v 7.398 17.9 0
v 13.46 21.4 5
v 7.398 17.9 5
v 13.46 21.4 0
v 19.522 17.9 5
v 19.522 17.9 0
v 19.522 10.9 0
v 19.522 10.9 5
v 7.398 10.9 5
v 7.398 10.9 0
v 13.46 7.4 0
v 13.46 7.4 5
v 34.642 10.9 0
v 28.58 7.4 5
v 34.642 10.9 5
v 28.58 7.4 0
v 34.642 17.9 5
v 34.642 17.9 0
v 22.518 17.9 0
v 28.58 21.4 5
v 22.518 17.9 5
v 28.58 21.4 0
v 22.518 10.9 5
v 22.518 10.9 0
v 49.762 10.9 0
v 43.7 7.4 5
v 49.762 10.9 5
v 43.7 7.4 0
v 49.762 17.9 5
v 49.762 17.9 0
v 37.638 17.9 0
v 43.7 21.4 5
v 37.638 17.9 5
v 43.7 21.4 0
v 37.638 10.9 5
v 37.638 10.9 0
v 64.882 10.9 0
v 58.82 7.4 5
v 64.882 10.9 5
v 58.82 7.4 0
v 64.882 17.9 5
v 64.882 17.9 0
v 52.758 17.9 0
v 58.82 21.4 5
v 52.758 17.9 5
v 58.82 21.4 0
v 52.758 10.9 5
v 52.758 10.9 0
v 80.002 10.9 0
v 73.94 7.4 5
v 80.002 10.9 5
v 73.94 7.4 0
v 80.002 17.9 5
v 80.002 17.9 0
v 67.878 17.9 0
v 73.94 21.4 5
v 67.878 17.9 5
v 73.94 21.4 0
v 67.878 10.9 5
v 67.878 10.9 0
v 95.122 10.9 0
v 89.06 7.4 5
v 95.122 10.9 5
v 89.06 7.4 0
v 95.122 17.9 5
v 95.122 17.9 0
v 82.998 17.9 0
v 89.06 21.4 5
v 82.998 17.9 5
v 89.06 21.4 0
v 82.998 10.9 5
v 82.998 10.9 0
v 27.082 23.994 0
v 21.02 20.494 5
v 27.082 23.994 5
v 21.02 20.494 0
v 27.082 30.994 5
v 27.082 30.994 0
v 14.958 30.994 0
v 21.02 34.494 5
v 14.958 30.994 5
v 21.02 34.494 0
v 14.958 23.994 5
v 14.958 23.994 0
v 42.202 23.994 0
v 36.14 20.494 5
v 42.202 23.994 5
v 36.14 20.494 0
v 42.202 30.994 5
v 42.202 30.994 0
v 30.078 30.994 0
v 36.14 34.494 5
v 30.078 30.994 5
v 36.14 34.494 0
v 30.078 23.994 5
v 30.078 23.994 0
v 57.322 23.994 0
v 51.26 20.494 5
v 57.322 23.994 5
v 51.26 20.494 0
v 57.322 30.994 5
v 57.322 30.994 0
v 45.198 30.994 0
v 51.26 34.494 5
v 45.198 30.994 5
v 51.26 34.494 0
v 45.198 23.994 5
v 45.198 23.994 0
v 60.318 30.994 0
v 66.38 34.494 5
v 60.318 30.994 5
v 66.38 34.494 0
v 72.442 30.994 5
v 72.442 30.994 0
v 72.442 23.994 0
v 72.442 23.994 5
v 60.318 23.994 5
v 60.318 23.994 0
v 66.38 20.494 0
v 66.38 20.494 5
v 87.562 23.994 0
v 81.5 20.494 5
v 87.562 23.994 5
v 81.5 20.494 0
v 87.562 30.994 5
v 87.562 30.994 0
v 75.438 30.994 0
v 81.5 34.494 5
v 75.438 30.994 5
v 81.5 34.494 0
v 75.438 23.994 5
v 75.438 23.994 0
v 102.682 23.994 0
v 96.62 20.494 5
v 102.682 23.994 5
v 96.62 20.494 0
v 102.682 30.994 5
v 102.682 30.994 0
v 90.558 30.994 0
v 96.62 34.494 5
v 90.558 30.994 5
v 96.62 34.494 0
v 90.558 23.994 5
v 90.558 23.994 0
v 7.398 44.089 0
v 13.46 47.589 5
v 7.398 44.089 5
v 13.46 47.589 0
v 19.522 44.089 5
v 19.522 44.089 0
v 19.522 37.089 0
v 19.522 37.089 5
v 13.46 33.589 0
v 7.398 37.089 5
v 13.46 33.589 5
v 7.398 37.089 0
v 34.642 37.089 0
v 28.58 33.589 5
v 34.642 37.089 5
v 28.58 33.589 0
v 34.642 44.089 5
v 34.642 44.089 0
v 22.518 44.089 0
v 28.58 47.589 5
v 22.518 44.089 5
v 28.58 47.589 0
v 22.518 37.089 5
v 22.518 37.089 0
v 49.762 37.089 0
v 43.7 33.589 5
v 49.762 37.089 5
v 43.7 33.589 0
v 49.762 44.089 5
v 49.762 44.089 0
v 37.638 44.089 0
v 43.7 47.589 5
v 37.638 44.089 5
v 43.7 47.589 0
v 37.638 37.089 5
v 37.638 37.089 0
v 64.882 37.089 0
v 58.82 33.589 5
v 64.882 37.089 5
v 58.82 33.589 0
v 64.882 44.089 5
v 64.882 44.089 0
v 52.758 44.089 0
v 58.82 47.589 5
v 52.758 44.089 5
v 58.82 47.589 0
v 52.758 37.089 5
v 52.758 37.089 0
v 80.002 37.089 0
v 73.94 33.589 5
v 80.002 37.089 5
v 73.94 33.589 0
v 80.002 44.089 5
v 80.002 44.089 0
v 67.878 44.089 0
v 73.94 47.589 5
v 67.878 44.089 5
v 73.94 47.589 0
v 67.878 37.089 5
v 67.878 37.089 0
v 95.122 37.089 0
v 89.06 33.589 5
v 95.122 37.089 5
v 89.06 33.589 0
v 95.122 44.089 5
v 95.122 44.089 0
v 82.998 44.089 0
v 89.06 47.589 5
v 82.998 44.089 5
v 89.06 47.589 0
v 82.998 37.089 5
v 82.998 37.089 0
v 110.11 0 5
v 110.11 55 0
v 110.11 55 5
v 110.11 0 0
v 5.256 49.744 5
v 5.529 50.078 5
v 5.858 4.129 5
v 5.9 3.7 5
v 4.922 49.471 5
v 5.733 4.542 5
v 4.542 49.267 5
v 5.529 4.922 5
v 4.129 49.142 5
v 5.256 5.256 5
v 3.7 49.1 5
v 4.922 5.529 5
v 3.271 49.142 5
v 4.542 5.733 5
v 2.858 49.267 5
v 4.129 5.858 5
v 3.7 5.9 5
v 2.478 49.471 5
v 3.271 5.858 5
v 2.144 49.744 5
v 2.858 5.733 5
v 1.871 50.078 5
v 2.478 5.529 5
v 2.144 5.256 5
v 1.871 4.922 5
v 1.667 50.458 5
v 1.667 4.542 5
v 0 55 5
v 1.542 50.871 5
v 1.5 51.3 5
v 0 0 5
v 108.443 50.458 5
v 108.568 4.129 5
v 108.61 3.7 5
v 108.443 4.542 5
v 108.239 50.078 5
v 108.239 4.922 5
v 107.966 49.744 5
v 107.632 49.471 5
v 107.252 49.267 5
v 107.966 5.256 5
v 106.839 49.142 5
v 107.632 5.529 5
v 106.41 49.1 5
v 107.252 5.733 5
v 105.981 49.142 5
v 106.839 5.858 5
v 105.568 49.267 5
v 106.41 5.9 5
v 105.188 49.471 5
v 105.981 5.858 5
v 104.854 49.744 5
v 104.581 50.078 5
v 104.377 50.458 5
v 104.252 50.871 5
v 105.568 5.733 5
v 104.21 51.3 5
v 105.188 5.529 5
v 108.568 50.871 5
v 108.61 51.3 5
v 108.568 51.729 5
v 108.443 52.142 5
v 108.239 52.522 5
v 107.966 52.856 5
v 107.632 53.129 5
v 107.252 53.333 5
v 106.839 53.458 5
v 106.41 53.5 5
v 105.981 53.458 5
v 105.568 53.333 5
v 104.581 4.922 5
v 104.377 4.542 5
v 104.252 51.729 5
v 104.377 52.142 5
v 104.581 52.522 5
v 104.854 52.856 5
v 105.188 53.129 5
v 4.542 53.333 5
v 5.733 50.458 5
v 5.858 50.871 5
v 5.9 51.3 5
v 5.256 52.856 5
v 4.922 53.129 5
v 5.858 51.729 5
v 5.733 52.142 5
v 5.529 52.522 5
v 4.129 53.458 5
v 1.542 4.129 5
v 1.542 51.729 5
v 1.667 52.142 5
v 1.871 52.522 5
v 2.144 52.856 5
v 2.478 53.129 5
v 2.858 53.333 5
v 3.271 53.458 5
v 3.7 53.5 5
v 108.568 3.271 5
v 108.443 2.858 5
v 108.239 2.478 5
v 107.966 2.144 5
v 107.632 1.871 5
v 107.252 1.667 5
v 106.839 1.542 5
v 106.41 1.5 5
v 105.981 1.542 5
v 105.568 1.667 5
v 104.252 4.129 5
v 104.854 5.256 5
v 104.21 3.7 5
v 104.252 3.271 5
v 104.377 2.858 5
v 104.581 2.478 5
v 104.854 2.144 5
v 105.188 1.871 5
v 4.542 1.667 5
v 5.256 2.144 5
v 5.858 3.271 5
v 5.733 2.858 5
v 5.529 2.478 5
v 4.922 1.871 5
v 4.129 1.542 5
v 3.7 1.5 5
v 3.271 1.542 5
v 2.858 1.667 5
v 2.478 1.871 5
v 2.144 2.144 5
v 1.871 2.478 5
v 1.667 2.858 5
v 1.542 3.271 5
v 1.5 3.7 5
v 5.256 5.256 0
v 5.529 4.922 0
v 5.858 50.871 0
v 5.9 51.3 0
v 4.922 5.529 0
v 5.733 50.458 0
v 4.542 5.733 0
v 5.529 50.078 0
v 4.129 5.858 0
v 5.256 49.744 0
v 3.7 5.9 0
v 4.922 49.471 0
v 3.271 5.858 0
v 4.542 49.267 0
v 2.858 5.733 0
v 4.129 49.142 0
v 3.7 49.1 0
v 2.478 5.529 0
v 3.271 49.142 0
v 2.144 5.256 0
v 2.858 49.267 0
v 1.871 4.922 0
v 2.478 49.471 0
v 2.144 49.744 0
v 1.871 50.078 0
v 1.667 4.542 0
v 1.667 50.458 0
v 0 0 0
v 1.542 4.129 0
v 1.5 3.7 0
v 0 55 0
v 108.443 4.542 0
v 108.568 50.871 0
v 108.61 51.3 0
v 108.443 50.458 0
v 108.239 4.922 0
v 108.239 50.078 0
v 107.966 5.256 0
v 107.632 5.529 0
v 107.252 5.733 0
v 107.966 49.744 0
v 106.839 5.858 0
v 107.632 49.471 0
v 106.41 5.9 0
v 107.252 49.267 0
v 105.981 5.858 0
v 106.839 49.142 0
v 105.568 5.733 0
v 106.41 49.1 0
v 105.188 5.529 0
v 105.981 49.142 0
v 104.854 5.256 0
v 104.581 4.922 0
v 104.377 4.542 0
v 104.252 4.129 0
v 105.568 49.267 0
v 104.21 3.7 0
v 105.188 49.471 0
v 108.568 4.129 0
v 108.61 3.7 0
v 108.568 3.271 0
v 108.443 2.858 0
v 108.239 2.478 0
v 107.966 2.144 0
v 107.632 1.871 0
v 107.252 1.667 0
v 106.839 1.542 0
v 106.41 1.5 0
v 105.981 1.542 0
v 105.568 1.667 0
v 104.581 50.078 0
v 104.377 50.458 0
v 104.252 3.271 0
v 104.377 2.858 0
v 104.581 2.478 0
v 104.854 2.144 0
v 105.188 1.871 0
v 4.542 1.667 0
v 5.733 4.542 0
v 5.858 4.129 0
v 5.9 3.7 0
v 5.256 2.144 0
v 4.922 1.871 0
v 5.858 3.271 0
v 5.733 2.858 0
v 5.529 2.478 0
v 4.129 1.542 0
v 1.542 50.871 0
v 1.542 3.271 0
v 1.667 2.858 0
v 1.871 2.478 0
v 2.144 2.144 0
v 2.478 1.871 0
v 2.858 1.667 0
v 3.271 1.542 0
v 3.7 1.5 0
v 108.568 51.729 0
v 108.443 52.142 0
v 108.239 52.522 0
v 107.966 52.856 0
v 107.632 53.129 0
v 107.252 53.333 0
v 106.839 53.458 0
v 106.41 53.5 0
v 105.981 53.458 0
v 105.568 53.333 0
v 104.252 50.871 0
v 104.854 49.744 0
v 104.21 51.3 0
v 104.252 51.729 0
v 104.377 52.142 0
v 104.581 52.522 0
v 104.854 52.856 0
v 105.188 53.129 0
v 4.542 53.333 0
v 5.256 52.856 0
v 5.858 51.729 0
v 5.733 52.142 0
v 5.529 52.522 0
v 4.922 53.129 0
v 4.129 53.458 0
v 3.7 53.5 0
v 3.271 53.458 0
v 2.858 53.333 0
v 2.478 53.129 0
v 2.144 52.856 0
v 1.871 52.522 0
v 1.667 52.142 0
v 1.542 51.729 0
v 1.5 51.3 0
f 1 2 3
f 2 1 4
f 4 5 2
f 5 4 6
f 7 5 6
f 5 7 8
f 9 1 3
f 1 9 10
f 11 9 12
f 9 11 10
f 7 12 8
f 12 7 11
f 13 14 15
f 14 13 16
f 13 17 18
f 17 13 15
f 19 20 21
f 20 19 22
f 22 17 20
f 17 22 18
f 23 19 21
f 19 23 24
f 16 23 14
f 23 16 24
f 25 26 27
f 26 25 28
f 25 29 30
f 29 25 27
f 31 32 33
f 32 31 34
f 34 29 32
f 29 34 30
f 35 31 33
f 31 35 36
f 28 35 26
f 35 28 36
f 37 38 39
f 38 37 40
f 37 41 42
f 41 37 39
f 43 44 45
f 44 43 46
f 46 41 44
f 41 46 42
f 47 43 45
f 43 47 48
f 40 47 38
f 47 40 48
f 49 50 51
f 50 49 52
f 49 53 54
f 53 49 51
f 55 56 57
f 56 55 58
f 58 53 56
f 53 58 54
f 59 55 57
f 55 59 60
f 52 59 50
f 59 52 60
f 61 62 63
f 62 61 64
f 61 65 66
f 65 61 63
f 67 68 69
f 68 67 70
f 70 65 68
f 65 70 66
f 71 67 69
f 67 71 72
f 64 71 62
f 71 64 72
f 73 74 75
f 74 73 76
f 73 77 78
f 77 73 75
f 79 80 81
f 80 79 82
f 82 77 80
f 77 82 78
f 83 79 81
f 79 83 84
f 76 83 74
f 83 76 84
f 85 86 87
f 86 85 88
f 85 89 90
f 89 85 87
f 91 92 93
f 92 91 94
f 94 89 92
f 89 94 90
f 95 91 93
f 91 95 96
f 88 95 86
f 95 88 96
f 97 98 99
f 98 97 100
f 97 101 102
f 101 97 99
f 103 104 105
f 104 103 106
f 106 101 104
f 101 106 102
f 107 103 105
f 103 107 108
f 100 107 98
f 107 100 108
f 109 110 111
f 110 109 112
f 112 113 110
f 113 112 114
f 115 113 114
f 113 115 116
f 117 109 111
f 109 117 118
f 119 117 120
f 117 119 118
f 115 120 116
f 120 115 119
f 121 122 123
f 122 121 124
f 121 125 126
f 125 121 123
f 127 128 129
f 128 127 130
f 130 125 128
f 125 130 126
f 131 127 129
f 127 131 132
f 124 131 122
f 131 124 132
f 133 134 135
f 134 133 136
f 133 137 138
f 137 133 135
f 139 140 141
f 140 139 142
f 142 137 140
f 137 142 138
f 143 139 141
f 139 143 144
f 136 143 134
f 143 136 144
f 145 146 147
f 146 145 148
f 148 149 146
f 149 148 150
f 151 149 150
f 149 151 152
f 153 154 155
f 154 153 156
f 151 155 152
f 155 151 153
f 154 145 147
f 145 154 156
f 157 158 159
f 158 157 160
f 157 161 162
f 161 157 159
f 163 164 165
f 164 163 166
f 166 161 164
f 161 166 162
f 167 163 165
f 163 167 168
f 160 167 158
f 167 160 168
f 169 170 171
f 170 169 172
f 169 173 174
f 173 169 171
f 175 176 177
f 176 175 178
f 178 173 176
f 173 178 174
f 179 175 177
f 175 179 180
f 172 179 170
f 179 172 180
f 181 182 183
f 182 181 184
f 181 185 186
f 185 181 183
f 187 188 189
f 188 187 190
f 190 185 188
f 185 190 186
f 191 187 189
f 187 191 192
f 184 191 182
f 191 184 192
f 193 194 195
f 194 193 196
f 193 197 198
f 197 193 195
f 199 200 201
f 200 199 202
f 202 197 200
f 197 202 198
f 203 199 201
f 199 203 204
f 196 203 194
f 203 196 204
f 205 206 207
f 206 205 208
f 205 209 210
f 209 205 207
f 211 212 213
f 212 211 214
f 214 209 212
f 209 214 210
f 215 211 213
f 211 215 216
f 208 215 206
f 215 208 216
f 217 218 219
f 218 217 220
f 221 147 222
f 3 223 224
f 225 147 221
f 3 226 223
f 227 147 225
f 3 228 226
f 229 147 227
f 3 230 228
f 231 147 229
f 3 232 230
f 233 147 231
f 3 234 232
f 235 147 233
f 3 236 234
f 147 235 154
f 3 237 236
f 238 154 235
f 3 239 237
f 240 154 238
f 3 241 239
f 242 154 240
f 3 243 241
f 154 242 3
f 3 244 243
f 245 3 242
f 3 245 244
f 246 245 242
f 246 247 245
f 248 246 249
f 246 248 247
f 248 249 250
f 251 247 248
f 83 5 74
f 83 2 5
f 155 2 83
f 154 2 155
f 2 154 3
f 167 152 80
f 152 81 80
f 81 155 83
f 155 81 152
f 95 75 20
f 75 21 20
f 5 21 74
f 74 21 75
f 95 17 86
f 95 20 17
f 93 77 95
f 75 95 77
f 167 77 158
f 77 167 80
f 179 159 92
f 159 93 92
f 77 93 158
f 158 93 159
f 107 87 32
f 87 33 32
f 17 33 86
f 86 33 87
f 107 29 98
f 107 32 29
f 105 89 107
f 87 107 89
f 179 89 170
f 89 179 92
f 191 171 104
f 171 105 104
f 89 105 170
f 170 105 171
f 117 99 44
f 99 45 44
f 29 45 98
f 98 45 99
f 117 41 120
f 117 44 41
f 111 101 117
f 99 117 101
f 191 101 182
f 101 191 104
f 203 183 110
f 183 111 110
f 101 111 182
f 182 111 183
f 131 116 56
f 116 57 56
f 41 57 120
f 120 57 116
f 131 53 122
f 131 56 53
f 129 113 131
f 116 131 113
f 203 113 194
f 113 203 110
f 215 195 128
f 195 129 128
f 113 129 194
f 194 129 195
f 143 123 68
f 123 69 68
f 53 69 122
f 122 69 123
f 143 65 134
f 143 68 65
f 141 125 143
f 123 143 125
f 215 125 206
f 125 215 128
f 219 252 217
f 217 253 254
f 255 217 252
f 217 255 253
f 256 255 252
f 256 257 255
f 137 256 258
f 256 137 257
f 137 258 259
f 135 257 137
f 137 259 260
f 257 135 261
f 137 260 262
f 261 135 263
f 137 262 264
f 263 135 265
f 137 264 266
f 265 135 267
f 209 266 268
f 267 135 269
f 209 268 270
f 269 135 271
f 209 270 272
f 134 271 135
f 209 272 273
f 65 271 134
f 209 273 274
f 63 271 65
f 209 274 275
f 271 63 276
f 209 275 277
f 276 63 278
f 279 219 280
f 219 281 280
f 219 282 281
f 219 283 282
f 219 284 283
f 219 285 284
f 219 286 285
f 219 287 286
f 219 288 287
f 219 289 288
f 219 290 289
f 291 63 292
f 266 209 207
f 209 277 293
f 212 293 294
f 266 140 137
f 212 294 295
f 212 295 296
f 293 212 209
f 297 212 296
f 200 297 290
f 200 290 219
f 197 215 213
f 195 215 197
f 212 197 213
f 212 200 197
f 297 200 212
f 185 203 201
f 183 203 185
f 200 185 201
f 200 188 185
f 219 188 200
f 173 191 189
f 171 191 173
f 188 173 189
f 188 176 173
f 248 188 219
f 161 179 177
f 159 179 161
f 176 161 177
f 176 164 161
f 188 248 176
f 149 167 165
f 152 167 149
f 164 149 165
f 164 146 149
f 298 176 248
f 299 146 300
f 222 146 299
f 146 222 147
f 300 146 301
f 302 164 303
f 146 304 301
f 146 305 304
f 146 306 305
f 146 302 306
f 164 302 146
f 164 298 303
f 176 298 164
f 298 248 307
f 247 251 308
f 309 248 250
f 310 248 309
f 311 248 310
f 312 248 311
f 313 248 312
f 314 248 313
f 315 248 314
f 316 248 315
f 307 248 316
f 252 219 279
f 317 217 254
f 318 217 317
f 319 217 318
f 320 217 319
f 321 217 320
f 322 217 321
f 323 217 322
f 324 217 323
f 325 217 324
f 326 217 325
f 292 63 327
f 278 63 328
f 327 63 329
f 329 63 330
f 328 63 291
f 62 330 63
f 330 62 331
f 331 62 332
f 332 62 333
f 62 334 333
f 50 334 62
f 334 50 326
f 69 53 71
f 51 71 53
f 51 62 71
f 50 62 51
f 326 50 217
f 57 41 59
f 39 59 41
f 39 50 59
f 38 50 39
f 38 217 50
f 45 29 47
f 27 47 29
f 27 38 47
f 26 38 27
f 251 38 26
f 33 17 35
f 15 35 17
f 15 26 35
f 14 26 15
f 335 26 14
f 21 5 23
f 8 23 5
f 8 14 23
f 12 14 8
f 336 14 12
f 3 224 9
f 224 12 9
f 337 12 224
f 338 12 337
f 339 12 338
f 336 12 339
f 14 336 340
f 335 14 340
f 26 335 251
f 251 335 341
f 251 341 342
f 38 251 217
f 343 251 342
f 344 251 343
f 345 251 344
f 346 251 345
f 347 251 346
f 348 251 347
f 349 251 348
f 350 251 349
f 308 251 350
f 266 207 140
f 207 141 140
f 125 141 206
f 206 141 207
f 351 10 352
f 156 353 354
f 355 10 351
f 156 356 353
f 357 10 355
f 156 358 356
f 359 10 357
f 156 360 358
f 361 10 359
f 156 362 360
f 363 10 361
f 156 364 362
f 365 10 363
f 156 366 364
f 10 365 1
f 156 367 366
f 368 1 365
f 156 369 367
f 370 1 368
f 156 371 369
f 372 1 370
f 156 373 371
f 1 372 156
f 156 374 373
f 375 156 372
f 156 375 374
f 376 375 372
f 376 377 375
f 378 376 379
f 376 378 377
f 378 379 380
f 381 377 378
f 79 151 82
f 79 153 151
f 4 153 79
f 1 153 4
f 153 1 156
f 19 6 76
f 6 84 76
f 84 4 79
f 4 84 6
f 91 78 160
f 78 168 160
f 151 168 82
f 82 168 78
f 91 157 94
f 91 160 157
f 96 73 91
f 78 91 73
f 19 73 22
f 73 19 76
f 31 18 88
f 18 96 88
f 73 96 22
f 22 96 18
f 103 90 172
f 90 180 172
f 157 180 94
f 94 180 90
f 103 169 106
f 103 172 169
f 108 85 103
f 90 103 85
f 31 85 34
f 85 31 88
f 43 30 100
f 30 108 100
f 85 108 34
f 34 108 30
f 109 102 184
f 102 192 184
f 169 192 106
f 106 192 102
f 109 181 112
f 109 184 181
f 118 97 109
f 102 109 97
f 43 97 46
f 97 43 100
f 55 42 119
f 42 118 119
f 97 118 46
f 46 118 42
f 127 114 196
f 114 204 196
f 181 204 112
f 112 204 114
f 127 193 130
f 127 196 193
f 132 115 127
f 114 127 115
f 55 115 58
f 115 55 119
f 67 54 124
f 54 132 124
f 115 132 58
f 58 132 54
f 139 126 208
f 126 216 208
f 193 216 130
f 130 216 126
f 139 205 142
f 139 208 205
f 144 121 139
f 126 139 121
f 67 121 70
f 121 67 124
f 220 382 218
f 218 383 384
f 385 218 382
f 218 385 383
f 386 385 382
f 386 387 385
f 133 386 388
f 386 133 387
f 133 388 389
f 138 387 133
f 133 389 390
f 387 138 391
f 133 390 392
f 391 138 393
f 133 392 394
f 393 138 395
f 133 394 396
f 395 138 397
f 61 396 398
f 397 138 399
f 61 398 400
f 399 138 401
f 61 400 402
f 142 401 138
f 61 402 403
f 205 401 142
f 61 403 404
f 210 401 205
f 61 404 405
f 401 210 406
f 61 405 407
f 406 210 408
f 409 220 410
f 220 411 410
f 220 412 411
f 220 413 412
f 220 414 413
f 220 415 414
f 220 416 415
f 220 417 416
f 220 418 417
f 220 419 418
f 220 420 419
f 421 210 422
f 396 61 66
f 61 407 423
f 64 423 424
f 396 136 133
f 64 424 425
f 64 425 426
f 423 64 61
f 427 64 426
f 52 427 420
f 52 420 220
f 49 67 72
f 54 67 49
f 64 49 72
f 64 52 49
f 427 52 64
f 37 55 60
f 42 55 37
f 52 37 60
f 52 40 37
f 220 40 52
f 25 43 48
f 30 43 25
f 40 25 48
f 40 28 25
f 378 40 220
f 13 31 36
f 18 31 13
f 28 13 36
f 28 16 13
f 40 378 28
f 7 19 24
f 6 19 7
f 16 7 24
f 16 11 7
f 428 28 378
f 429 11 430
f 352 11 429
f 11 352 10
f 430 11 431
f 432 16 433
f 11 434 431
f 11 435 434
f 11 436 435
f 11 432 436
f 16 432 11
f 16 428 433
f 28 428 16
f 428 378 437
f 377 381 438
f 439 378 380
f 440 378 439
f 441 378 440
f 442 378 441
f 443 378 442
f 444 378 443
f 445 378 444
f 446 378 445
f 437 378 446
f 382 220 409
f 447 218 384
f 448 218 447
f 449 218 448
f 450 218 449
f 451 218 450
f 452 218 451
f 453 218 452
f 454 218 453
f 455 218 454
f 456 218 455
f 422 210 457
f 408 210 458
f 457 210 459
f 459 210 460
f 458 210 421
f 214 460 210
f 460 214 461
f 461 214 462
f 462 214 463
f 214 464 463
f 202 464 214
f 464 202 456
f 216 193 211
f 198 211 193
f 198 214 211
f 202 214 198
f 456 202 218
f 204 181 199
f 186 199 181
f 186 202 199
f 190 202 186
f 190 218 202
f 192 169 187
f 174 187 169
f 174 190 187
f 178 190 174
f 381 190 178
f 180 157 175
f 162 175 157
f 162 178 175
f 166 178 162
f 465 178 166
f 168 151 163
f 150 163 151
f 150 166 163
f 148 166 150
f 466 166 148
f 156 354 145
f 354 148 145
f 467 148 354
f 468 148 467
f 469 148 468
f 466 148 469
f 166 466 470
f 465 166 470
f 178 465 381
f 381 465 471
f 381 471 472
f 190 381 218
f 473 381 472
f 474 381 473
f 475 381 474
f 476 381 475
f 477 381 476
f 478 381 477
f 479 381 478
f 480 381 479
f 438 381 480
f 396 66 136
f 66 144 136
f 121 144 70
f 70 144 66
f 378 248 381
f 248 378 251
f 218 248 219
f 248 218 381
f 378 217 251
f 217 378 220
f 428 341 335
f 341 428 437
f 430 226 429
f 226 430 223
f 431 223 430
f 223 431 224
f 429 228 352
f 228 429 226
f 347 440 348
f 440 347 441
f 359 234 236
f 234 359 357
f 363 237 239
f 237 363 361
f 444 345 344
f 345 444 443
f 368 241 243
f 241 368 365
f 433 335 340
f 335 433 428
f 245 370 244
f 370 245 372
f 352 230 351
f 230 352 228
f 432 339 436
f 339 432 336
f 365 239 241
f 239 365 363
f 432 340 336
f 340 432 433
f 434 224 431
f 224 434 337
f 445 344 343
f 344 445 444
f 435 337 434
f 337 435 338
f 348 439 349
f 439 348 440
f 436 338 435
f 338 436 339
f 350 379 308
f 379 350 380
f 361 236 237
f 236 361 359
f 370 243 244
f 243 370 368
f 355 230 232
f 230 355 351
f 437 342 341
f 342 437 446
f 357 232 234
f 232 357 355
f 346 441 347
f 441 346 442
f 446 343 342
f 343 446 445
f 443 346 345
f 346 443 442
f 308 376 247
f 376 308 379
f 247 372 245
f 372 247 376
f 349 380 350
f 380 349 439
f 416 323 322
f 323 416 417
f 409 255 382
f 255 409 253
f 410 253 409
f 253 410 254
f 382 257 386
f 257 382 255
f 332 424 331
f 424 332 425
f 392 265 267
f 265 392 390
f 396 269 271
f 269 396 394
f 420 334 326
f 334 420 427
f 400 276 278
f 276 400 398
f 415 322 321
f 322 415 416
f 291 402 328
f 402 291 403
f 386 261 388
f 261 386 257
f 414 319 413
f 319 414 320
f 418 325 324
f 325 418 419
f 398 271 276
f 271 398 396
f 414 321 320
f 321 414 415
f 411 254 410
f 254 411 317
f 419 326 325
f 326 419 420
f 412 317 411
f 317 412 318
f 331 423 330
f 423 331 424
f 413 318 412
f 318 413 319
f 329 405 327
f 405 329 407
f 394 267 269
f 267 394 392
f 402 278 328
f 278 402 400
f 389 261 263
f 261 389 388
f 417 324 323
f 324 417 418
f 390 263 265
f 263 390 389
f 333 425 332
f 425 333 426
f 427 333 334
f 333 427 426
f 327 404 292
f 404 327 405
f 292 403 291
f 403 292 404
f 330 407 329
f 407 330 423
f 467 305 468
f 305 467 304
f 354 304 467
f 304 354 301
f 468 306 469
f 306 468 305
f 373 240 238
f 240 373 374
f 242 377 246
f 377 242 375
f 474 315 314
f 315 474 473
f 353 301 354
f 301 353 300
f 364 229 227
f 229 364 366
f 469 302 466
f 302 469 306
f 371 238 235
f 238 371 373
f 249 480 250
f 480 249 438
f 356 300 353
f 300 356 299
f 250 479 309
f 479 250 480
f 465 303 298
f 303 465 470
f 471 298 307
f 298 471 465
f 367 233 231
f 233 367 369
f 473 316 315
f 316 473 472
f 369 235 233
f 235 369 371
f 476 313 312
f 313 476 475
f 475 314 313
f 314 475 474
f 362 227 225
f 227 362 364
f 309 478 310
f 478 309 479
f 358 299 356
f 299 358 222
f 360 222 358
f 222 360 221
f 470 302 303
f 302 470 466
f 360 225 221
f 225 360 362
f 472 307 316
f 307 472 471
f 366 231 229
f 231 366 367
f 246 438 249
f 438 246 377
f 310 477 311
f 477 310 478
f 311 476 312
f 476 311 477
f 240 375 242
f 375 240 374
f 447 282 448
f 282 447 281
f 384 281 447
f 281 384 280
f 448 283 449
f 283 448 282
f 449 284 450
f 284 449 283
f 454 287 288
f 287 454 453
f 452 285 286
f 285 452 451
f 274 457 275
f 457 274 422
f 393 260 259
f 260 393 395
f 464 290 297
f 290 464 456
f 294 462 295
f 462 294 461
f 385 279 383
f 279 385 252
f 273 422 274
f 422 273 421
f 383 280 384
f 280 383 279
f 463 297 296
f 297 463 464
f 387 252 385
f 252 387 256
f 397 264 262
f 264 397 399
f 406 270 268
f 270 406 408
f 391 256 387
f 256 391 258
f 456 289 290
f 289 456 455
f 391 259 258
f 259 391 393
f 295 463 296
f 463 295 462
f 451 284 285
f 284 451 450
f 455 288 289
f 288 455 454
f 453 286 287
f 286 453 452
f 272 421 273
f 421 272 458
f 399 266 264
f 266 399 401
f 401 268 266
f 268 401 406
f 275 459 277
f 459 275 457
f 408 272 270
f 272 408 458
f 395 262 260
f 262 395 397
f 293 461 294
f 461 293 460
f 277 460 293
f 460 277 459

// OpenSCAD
$fn = 32;

// ----------------------------------------------------------------------
// Honeycomb panel: 110.11 x 55 mm, 18 cells of 14 mm
// ----------------------------------------------------------------------

// --- parameters (mm) ---
panel_w = 110.11;         // panel width
panel_d = 55;             // panel depth
thick = 5;                // panel thickness
cell_r = 7;               // hex cell circumradius
pitch = 15.12;            // hex cell pitch (centre to centre)
web = 3;                  // web between the cells
columns = 6;              // columns of cells
rows = 3;                 // rows of cells
cell_count = 18;          // total cells
shift_x = 13.46;          // first cell offset in x
shift_y = 14.4;           // first cell offset in y
mount_d = 4.4;            // corner mounting holes
hole_off = 3.7;           // mounting hole offset from the corners

difference() {
  union() {
    cube([panel_w, panel_d, thick]);
  }
  /* hexagonal cells, point-up, cut right through the plate */
  for (row = [0 : rows - 1]) {
    for (col = [0 : columns - 1]) {
      translate([shift_x + col * pitch + (row % 2) * pitch / 2, shift_y + row * pitch * 0.866025, -2.5]) rotate([0, 0, 30]) cylinder(h = thick + 5, d = 2 * cell_r, $fn = 6);
    }
  }
  /* corner mounting holes, clear of the outer cell web */
  translate([3.7, 3.7, -2.5]) cylinder(h = thick + 5, d = mount_d);
  translate([106.41, 3.7, -2.5]) cylinder(h = thick + 5, d = mount_d);
  translate([3.7, 51.3, -2.5]) cylinder(h = thick + 5, d = mount_d);
  translate([106.41, 51.3, -2.5]) cylinder(h = thick + 5, d = mount_d);
}
